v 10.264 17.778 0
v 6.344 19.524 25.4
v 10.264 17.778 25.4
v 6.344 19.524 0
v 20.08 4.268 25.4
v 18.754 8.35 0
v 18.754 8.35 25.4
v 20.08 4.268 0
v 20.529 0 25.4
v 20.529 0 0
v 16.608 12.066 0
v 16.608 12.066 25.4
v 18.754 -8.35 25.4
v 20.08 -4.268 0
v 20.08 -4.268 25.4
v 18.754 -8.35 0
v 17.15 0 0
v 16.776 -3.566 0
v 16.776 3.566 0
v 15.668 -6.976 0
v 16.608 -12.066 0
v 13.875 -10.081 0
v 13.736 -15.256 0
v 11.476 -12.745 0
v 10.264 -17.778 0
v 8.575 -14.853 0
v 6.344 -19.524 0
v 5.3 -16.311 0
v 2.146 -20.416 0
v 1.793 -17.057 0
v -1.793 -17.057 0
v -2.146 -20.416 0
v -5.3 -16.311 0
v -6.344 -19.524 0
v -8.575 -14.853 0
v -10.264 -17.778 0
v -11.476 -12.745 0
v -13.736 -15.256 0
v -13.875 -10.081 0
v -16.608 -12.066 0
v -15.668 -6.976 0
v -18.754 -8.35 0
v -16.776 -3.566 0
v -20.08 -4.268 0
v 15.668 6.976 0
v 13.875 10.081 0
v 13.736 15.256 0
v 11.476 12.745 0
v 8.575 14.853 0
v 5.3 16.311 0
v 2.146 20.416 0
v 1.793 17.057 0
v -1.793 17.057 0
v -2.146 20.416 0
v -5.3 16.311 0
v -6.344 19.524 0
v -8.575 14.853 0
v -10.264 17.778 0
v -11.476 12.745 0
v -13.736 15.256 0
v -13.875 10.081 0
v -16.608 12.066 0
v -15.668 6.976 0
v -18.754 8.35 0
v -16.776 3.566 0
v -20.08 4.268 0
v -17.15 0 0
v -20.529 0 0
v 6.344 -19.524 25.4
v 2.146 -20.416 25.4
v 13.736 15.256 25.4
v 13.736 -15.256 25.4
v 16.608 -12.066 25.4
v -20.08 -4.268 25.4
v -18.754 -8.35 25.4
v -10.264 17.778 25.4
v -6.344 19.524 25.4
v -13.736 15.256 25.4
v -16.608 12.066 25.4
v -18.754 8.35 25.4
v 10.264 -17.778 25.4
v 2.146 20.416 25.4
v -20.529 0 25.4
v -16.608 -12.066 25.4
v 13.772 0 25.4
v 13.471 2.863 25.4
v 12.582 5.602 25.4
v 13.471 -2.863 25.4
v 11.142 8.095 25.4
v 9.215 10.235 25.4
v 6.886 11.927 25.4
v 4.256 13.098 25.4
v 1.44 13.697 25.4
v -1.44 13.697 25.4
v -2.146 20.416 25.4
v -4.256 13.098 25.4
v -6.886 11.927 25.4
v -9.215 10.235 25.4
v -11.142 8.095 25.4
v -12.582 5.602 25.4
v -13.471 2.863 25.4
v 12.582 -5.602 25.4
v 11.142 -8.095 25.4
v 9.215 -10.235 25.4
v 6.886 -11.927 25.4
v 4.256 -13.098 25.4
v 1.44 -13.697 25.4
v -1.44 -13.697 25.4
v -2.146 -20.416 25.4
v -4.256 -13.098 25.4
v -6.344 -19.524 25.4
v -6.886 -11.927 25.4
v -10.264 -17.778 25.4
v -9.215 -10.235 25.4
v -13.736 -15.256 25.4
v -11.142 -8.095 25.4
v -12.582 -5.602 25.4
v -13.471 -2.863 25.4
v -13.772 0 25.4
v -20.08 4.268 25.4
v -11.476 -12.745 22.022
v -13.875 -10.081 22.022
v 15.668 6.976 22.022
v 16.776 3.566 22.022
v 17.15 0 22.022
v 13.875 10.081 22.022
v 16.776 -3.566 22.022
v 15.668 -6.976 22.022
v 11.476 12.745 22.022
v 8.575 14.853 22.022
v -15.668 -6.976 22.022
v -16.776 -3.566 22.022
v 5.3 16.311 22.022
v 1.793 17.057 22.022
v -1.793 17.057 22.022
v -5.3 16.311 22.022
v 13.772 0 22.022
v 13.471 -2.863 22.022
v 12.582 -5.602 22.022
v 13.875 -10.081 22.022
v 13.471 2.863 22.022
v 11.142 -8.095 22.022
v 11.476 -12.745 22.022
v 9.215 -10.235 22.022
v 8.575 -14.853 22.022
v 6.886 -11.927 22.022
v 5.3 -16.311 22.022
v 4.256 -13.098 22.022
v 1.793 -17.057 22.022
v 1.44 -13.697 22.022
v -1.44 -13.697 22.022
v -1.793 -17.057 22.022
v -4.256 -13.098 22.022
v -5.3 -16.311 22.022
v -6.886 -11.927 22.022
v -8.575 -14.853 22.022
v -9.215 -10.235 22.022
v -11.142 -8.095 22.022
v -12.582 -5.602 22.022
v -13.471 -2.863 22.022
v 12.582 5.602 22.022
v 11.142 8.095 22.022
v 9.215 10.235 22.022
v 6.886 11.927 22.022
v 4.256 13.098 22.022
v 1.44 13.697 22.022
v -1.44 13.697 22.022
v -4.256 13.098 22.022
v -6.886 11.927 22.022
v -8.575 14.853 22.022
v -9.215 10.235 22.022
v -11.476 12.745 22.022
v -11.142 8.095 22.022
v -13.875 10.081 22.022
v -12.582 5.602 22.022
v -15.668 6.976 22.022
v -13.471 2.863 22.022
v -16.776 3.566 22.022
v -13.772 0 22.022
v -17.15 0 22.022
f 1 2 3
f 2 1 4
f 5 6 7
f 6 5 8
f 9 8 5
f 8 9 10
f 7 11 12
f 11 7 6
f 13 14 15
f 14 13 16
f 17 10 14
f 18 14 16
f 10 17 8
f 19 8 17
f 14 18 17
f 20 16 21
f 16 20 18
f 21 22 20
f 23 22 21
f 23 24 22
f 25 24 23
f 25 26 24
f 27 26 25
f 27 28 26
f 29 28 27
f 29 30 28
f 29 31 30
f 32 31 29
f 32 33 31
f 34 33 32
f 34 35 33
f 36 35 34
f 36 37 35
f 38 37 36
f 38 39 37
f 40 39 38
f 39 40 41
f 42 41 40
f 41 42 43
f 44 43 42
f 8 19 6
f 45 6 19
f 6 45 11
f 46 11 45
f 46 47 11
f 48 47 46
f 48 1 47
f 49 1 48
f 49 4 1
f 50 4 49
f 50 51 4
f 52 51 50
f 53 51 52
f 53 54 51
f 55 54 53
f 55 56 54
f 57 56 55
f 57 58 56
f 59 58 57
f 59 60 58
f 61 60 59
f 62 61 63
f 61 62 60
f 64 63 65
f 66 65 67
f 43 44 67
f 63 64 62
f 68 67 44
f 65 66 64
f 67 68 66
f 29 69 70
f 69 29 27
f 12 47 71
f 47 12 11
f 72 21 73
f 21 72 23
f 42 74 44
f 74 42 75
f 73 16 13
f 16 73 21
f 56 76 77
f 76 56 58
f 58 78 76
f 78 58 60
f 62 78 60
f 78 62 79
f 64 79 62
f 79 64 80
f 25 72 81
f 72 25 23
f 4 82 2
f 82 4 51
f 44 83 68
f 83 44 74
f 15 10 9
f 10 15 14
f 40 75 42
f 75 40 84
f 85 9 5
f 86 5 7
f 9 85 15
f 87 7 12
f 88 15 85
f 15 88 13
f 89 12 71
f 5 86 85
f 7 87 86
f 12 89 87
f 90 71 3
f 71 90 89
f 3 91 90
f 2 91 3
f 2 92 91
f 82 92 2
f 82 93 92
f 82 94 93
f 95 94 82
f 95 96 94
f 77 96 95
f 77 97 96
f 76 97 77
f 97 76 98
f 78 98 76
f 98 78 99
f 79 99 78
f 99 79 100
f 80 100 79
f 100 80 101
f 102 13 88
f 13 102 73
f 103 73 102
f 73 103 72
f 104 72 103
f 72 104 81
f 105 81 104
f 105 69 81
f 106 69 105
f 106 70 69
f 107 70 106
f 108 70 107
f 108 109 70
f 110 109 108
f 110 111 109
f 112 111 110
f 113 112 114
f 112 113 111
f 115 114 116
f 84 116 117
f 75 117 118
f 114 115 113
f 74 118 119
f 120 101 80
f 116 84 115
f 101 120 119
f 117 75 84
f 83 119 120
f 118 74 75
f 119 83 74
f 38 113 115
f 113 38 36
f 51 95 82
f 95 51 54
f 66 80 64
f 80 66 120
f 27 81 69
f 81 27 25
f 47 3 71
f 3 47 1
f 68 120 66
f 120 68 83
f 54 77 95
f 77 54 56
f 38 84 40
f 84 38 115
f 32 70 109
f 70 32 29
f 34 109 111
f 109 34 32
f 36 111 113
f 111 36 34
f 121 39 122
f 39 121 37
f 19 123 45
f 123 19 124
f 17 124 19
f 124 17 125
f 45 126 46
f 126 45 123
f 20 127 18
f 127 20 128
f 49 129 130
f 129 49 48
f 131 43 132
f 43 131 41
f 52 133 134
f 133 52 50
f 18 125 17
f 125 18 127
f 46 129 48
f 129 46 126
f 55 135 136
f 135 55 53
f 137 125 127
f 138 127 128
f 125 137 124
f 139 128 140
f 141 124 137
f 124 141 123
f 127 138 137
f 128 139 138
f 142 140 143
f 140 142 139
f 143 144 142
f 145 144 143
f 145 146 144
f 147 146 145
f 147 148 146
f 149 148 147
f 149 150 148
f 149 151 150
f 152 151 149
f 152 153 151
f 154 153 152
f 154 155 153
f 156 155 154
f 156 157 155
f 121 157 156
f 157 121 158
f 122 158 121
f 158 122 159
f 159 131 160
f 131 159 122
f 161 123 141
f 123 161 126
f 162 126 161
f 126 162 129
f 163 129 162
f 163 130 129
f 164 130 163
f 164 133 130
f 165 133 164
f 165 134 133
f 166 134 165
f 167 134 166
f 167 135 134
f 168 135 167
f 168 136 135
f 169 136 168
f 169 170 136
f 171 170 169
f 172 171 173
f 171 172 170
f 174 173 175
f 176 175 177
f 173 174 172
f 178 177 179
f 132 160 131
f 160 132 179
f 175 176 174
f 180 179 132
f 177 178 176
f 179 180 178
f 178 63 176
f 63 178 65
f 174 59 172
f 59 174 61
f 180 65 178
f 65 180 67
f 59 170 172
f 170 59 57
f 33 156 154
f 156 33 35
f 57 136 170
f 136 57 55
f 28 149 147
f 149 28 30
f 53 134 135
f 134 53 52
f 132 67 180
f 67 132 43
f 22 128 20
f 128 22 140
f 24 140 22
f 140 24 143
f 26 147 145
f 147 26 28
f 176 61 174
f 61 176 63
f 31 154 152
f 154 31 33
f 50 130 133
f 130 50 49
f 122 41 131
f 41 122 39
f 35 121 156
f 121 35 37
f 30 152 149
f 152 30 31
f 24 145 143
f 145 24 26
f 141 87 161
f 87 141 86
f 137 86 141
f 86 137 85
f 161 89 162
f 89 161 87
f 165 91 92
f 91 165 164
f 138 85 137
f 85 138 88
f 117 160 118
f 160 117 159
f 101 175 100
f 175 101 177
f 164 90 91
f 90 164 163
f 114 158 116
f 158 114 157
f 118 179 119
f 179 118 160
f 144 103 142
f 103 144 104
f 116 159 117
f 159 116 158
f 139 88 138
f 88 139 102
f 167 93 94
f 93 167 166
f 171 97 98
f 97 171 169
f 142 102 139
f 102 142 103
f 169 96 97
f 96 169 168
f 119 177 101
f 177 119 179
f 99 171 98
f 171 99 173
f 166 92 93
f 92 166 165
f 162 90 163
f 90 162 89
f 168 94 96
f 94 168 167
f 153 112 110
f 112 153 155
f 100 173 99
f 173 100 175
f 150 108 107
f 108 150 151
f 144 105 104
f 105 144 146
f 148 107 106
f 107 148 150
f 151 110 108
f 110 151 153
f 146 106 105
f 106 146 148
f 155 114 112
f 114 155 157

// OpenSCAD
/*  Slip Coupler v0.1 OpenSCAD Library
    Copyright (C) 2017 The Maker Garage

    This program is free software: you can redistribute it and/or modify
    it under the terms of the GNU General Public License as published by
    the Free Software Foundation, either version 3 of the License, or
    (at your option) any later version.

    This program is distributed in the hope that it will be useful,
    but WITHOUT ANY WARRANTY; without even the implied warranty of
    MERCHANTABILITY or FITNESS FOR A PARTICULAR PURPOSE.  See the
    GNU General Public License for more details.

    You should have received a copy of the GNU General Public License
    along with this program.  If not, see <http://www.gnu.org/licenses/>.
    
*/

/*  To Do:
    - Add Error Checking
    - Add Support for 0 length (flat) transition
    - Improve documentation for library and each module
    - Enhance to be a universal coupler
        - Refactor to support each fitting type as a module
        - Add support for threaded fittings
        - Add support for hose bard fittings
        - Add support for english_units
*/

nps_fitting(1, "female");

function imp2metric(x) = x*25.4;
function metric2imp (x) = x/25.4;

module slip_fitting(diameter, length, thickness, gender, units)
{
    //Convert Imperial to Metric (default is metric)
    thickness= units == "imperial" ? imp2metric(thickness) : thickness;
    diameter= units == "imperial" ? imp2metric(diameter) : diameter;
    length= units == "imperial" ? imp2metric(length) : length;
    
    //Validate thickness (default is 2mm)
    t= thickness>0 ? thickness : 2;
    
    //Validate diameter (default is 10mm)
    d= diameter > 0 ? diameter : 10;
    
    //Validate Length (default is 10mm)
    ol= length > 0 ? length : 10;

    // If female add stop
    il= gender == "male" ? ol : ol-t;

    //Checks gender and set diameters (default is female)
    od= gender == "male" ? d : d+t+t+0.9;
    id= gender == "male" ? d-t-t : d+0.9;
        
    difference ()  //Build Coupler
        {
            //Create Outer Cylinder
            translate ([0, 0, 0]) cylinder(h=ol, d=od);
            //Subtract Inner Cylinder
            translate ([0, 0, 0]) cylinder(h=il, d=id);
            translate ([0, 0, 0]) cylinder(h=ol, d=(id-t-t));
        };
};

module nps_fitting(nps, gender, schedule)
{
    //  Values based on:  
    //  http://www.engineersedge.com/pipe_schedules.htm
    //  Retrieved on 4/28/2017
    if(nps == 0.125)
    {
        if (schedule == "5")
        {
            slip_fitting(0.405, 1, 0.035, gender, "imperial"); 
        }
        else if ((schedule == "10s") || (schedule == "10"))
        {
            slip_fitting(0.405, 1, 0.049, gender, "imperial"); 
        }
        else if ((schedule == "80s") || (schedule == "80"))
        {
            slip_fitting(0.405, 1, 0.095, gender, "imperial"); 
        }
        else
        {
            //Defaulting to Schedule 40/40s/standard
            slip_fitting(0.405, 1, 0.068, gender, "imperial"); 
        }
    }
    else if (nps == 0.25)
    {
        if (schedule == "5")
        {
            slip_fitting(0.540, 1, 0.049, gender, "imperial"); 
        }
        else if ((schedule == "10s") || (schedule == "10"))
        {
            slip_fitting(0.540, 1, 0.065, gender, "imperial"); 
        }
        else if ((schedule == "80s") || (schedule == "80"))
        {
            slip_fitting(0.540, 1, 0.119, gender, "imperial"); 
        }
        else
        {
            //Defaulting to Schedule 40/40s/standard
            slip_fitting(0.540, 1, 0.088, gender, "imperial"); 
        }
    }
    else if (nps == 0.375)
    {
        if (schedule == "5")
        {
            slip_fitting(0.675, 1, 0.049, gender, "imperial"); 
        }
        else if ((schedule == "10s") || (schedule == "10"))
        {
            slip_fitting(0.675, 1, 0.065, gender, "imperial"); 
        }
        else if ((schedule == "80s") || (schedule == "80"))
        {
            slip_fitting(0.675, 1, 0.126, gender, "imperial"); 
        }
        else
        {
            //Defaulting to Schedule 40/40s/standard
            slip_fitting(0.675, 1, 0.091, gender, "imperial"); 
        }
    }
    else if (nps == 0.5)
    {
        if ((schedule == "5s") || (schedule == "5"))
        {
            slip_fitting(0.840, 1, 0.065, gender, "imperial"); 
        }
        else if ((schedule == "10s") || (schedule == "10"))
        {
            slip_fitting(0.840, 1, 0.083, gender, "imperial"); 
        }
        else if ((schedule == "80s") || (schedule == "80"))
        {
            slip_fitting(0.840, 1, 0.147, gender, "imperial"); 
        }
        else if (schedule == "160")
        {
            slip_fitting(0.840, 1, 0.187, gender, "imperial"); 
        }
        else
        {
            //Defaulting to Schedule 40/40s/standard
            slip_fitting(0.840, 1, 0.109, gender, "imperial"); 
        }
    }
    else if (nps == 0.75)
    {
        if ((schedule == "5s") || (schedule == "5"))
        {
            slip_fitting(1.050, 1, 0.065, gender, "imperial"); 
        }
        else if ((schedule == "10s") || (schedule == "10"))
        {
            slip_fitting(1.050, 1, 0.083, gender, "imperial"); 
        }
        else if ((schedule == "80s") || (schedule == "80"))
        {
            slip_fitting(1.050, 1, 0.154, gender, "imperial"); 
        }
        else if (schedule == "160")
        {
            slip_fitting(1.050, 1, 0.218, gender, "imperial"); 
        }
        else
        {
            //Defaulting to Schedule 40/40s/standard
            slip_fitting(1.050, 1, 0.113, gender, "imperial"); 
        }
    }
    else if (nps == 1)
    {
        if ((schedule == "5s") || (schedule == "5"))
        {
            slip_fitting(1.315, 1, 0.065, gender, "imperial"); 
        }
        else if ((schedule == "10s") || (schedule == "10"))
        {
            slip_fitting(1.315, 1, 0.109, gender, "imperial"); 
        }
        else if ((schedule == "80s") || (schedule == "80"))
        {
            slip_fitting(1.315, 1, 0.179, gender, "imperial"); 
        }
        else if (schedule == "160")
        {
            slip_fitting(1.315, 1, 0.250, gender, "imperial"); 
        }
        else
        {
            //Defaulting to Schedule 40/40s/standard
            slip_fitting(1.315, 1, 0.133, gender, "imperial"); 
        }
    }
    else if (nps == 1.25)
    {
        if ((schedule == "5s") || (schedule == "5"))
        {
            slip_fitting(1.660, 1.25, 0.065, gender, "imperial"); 
        }
        else if ((schedule == "10s") || (schedule == "10"))
        {
            slip_fitting(1.660, 1.25, 0.109, gender, "imperial"); 
        }
        else if ((schedule == "80s") || (schedule == "80"))
        {
            slip_fitting(1.660, 1.25, 0.191, gender, "imperial"); 
        }
        else if (schedule == "160")
        {
            slip_fitting(1.660, 1.25, 0.250, gender, "imperial"); 
        }
        else
        {
            //Defaulting to Schedule 40/40s/standard
            slip_fitting(1.660, 1.25, 0.140, gender, "imperial"); 
        }
    }
    else if (nps == 1.5)
    {
        if ((schedule == "5s") || (schedule == "5"))
        {
            slip_fitting(1.900, 1.5, 0.065, gender, "imperial"); 
        }
        else if ((schedule == "10s") || (schedule == "10"))
        {
            slip_fitting(1.900, 1.5, 0.109, gender, "imperial"); 
        }
        else if ((schedule == "80s") || (schedule == "80"))
        {
            slip_fitting(1.900, 1.5, 0.200, gender, "imperial"); 
        }
        else if (schedule == "160")
        {
            slip_fitting(1.900, 1.5, 0.281, gender, "imperial"); 
        }
        else
        {
            //Defaulting to Schedule 40/40s/standard
            slip_fitting(1.900, 1.5, 0.145, gender, "imperial"); 
        }
    }
    else if (nps == 2)
    {
        if ((schedule == "5s") || (schedule == "5"))
        {
            slip_fitting(2.375, 2, 0.065, gender, "imperial"); 
        }
        else if ((schedule == "10s") || (schedule == "10"))
        {
            slip_fitting(2.375, 2, 0.109, gender, "imperial"); 
        }
        else if ((schedule == "80s") || (schedule == "80"))
        {
            slip_fitting(2.375, 2, 0.218, gender, "imperial"); 
        }
        else if (schedule == "160")
        {
            slip_fitting(2.375, 2, 0.343, gender, "imperial"); 
        }
        else
        {
            //Defaulting to Schedule 40/40s/standard
            slip_fitting(2.375, 2, 0.154, gender, "imperial"); 
        }
    }
    else if (nps == 2.5)
    {
        if ((schedule == "5s") || (schedule == "5"))
        {
            slip_fitting(2.875, 2.5, 0.083, gender, "imperial"); 
        }
        else if ((schedule == "10s") || (schedule == "10"))
        {
            slip_fitting(2.875, 2.5, 0.120, gender, "imperial"); 
        }
        else if ((schedule == "80s") || (schedule == "80"))
        {
            slip_fitting(2.875, 2.5, 0.276, gender, "imperial"); 
        }
        else if (schedule == "160")
        {
            slip_fitting(2.875, 2.5, 0.375, gender, "imperial"); 
        }
        else
        {
            //Defaulting to Schedule 40/40s/standard
            slip_fitting(2.875, 2.5, 0.203, gender, "imperial"); 
        }
    }
    else if (nps == 3)
    {
        if ((schedule == "5s") || (schedule == "5"))
        {
            slip_fitting(3.500, 3, 0.083, gender, "imperial"); 
        }
        else if ((schedule == "10s") || (schedule == "10"))
        {
            slip_fitting(3.500, 3, 0.120, gender, "imperial"); 
        }
        else if ((schedule == "80s") || (schedule == "80"))
        {
            slip_fitting(3.500, 3, 0.300, gender, "imperial"); 
        }
        else if (schedule == "160")
        {
            slip_fitting(3.500, 3, 0.437, gender, "imperial"); 
        }
        else
        {
            //Defaulting to Schedule 40/40s/standard
            slip_fitting(3.500, 3, 0.216, gender, "imperial"); 
        }
    }
    else if (nps == 3.5)
    {
        if ((schedule == "5s") || (schedule == "5"))
        {
            slip_fitting(4.000, 3.5, 0.083, gender, "imperial"); 
        }
        else if ((schedule == "10s") || (schedule == "10"))
        {
            slip_fitting(4.000, 3.5, 0.120, gender, "imperial"); 
        }
        else if ((schedule == "80s") || (schedule == "80"))
        {
            slip_fitting(4.000, 3.5, 0.318, gender, "imperial"); 
        }
        else
        {
            //Defaulting to Schedule 40/40s/standard
            slip_fitting(4.000, 3.5, 0.226, gender, "imperial"); 
        }
    }
    else if (nps == 4)
    {
        if ((schedule == "5s") || (schedule == "5"))
        {
            slip_fitting(4.500, 4, 0.083, gender, "imperial"); 
        }
        else if ((schedule == "10s") || (schedule == "10"))
        {
            slip_fitting(4.500, 4, 0.120, gender, "imperial"); 
        }
        else if (schedule == "60")
        {
            slip_fitting(4.500, 4, 0.281, gender, "imperial"); 
        }
        else if ((schedule == "80s") || (schedule == "80"))
        {
            slip_fitting(4.500, 4, 0.337, gender, "imperial"); 
        }
        else if (schedule == "120")
        {
            slip_fitting(4.500, 4, 0.437, gender, "imperial"); 
        }
        else if (schedule == "160")
        {
            slip_fitting(4.500, 4, 0.531, gender, "imperial"); 
        }
        else
        {
            //Defaulting to Schedule 40/40s/standard
            slip_fitting(4.500, 4, 0.237, gender, "imperial"); 
        }
    }
        

};

module coupler(bottomDiameter, bottomDepth, bottomType, bottomUnits, bottomGender, topDiameter, topDepth, transitionLength, wallThickness)
{
};
module f2f_slip_coupler(bottomDiameter, bottomDepth, topDiameter, topDepth, transitionLength, wallThickness)
{
    union ()  //Combine Bottom, Transition, and Top
    {
        //translate([0, 0, 0]) slip_fitting(bottomDiameter, bottomDepth, wallThickness, "female", "metric");
        /*difference ()  //Build Bottom Coupler
        {
            //Create Outer Cylinder
            translate ([0, 0, 0]) cylinder(h=bottomDepth, d=(bottomDiameter+wallThickness+wallThickness));
            //Subtract Inner Cylinder
            translate ([0, 0, 0]) cylinder(h=bottomDepth, d=bottomDiameter);
        };*/
        
        difference ()  //Build Transition
        {
            //Create Outer Cone
            translate ([0, 0, bottomDepth]) cylinder(h=(transitionLength), d1=(bottomDiameter+wallThickness+wallThickness), d2=(topDiameter+wallThickness+wallThickness));
            //Create Inner Cone
            translate ([0, 0, bottomDepth]) cylinder(h=(transitionLength), d1=bottomDiameter, d2=topDiameter);
        };
        
        difference ()  //Build Top Coupler
        {
            //Create Outer Cylinder
            translate ([0, 0, (bottomDepth+transitionLength)]) cylinder(h=topDepth, d=(topDiameter+wallThickness+wallThickness));
            //Subtract Inner Cylinder
            translate ([0, 0, (bottomDepth+transitionLength)]) cylinder(h=topDepth+2, d=topDiameter);
        };
        
    };
};

module m2m_slip_coupler(bottomDiameter, bottomDepth, topDiameter, topDepth, transitionLength, wallThickness)
{
    union ()  //Combine Bottom, Transition, and Top
    {
        
        difference ()  //Build Bottom Coupler
        {
            //Create Outer Cylinder
            translate ([0, 0, 0]) cylinder(h=bottomDepth, d=bottomDiameter);
            //Subtract Inner Cylinder
            translate ([0, 0, 0]) cylinder(h=bottomDepth, d=(bottomDiameter-wallThickness-wallThickness));
        };
        
        difference ()  //Build Transition
        {
            //Create Outer Cone
            translate ([0, 0, bottomDepth]) cylinder(h=transitionLength, d1=bottomDiameter, d2=topDiameter);
            //Create Inner Cone
            translate ([0, 0, bottomDepth]) cylinder(h=transitionLength, d1=(bottomDiameter-wallThickness-wallThickness), d2=(topDiameter-wallThickness-wallThickness));
        };
        
        difference ()  //Build Top Coupler
        {
            //Create Outer Cylinder
            translate ([0, 0, (bottomDepth+transitionLength)]) cylinder(h=topDepth, d=topDiameter);
            //Subtract Inner Cylinder
            translate ([0, 0, (bottomDepth+transitionLength)]) cylinder(h=topDepth, d=(topDiameter-wallThickness-wallThickness));
        };
        
    };
};

module f2m_slip_coupler(bottomDiameter, bottomDepth, topDiameter, topDepth, transitionLength, wallThickness)
{
    union ()  //Combine Bottom, Transition, and Top
    {
        
        difference ()  //Build Bottom Coupler
        {
            //Create Outer Cylinder
            translate ([0, 0, 0]) cylinder(h=bottomDepth, d=(bottomDiameter+wallThickness+wallThickness));
            //Subtract Inner Cylinder
            translate ([0, 0, 0]) cylinder(h=bottomDepth, d=bottomDiameter);
        };
        
        difference ()  //Build Transition
        {
            //Create Outer Cone
            translate ([0, 0, bottomDepth]) cylinder(h=(transitionLength), d1=(bottomDiameter+wallThickness+wallThickness), d2=topDiameter);
            //Create Inner Cone
            translate ([0, 0, bottomDepth]) cylinder(h=(transitionLength), d1=bottomDiameter, d2=(topDiameter-wallThickness-wallThickness));
        };
        
        difference ()  //Build Top Coupler
        {
            //Create Outer Cylinder
            translate ([0, 0, (bottomDepth+transitionLength)]) cylinder(h=topDepth, d=topDiameter);
            //Subtract Inner Cylinder
            translate ([0, 0, (bottomDepth+transitionLength)]) cylinder(h=topDepth, d=(topDiameter-wallThickness-wallThickness));
        };
        
    };
};
